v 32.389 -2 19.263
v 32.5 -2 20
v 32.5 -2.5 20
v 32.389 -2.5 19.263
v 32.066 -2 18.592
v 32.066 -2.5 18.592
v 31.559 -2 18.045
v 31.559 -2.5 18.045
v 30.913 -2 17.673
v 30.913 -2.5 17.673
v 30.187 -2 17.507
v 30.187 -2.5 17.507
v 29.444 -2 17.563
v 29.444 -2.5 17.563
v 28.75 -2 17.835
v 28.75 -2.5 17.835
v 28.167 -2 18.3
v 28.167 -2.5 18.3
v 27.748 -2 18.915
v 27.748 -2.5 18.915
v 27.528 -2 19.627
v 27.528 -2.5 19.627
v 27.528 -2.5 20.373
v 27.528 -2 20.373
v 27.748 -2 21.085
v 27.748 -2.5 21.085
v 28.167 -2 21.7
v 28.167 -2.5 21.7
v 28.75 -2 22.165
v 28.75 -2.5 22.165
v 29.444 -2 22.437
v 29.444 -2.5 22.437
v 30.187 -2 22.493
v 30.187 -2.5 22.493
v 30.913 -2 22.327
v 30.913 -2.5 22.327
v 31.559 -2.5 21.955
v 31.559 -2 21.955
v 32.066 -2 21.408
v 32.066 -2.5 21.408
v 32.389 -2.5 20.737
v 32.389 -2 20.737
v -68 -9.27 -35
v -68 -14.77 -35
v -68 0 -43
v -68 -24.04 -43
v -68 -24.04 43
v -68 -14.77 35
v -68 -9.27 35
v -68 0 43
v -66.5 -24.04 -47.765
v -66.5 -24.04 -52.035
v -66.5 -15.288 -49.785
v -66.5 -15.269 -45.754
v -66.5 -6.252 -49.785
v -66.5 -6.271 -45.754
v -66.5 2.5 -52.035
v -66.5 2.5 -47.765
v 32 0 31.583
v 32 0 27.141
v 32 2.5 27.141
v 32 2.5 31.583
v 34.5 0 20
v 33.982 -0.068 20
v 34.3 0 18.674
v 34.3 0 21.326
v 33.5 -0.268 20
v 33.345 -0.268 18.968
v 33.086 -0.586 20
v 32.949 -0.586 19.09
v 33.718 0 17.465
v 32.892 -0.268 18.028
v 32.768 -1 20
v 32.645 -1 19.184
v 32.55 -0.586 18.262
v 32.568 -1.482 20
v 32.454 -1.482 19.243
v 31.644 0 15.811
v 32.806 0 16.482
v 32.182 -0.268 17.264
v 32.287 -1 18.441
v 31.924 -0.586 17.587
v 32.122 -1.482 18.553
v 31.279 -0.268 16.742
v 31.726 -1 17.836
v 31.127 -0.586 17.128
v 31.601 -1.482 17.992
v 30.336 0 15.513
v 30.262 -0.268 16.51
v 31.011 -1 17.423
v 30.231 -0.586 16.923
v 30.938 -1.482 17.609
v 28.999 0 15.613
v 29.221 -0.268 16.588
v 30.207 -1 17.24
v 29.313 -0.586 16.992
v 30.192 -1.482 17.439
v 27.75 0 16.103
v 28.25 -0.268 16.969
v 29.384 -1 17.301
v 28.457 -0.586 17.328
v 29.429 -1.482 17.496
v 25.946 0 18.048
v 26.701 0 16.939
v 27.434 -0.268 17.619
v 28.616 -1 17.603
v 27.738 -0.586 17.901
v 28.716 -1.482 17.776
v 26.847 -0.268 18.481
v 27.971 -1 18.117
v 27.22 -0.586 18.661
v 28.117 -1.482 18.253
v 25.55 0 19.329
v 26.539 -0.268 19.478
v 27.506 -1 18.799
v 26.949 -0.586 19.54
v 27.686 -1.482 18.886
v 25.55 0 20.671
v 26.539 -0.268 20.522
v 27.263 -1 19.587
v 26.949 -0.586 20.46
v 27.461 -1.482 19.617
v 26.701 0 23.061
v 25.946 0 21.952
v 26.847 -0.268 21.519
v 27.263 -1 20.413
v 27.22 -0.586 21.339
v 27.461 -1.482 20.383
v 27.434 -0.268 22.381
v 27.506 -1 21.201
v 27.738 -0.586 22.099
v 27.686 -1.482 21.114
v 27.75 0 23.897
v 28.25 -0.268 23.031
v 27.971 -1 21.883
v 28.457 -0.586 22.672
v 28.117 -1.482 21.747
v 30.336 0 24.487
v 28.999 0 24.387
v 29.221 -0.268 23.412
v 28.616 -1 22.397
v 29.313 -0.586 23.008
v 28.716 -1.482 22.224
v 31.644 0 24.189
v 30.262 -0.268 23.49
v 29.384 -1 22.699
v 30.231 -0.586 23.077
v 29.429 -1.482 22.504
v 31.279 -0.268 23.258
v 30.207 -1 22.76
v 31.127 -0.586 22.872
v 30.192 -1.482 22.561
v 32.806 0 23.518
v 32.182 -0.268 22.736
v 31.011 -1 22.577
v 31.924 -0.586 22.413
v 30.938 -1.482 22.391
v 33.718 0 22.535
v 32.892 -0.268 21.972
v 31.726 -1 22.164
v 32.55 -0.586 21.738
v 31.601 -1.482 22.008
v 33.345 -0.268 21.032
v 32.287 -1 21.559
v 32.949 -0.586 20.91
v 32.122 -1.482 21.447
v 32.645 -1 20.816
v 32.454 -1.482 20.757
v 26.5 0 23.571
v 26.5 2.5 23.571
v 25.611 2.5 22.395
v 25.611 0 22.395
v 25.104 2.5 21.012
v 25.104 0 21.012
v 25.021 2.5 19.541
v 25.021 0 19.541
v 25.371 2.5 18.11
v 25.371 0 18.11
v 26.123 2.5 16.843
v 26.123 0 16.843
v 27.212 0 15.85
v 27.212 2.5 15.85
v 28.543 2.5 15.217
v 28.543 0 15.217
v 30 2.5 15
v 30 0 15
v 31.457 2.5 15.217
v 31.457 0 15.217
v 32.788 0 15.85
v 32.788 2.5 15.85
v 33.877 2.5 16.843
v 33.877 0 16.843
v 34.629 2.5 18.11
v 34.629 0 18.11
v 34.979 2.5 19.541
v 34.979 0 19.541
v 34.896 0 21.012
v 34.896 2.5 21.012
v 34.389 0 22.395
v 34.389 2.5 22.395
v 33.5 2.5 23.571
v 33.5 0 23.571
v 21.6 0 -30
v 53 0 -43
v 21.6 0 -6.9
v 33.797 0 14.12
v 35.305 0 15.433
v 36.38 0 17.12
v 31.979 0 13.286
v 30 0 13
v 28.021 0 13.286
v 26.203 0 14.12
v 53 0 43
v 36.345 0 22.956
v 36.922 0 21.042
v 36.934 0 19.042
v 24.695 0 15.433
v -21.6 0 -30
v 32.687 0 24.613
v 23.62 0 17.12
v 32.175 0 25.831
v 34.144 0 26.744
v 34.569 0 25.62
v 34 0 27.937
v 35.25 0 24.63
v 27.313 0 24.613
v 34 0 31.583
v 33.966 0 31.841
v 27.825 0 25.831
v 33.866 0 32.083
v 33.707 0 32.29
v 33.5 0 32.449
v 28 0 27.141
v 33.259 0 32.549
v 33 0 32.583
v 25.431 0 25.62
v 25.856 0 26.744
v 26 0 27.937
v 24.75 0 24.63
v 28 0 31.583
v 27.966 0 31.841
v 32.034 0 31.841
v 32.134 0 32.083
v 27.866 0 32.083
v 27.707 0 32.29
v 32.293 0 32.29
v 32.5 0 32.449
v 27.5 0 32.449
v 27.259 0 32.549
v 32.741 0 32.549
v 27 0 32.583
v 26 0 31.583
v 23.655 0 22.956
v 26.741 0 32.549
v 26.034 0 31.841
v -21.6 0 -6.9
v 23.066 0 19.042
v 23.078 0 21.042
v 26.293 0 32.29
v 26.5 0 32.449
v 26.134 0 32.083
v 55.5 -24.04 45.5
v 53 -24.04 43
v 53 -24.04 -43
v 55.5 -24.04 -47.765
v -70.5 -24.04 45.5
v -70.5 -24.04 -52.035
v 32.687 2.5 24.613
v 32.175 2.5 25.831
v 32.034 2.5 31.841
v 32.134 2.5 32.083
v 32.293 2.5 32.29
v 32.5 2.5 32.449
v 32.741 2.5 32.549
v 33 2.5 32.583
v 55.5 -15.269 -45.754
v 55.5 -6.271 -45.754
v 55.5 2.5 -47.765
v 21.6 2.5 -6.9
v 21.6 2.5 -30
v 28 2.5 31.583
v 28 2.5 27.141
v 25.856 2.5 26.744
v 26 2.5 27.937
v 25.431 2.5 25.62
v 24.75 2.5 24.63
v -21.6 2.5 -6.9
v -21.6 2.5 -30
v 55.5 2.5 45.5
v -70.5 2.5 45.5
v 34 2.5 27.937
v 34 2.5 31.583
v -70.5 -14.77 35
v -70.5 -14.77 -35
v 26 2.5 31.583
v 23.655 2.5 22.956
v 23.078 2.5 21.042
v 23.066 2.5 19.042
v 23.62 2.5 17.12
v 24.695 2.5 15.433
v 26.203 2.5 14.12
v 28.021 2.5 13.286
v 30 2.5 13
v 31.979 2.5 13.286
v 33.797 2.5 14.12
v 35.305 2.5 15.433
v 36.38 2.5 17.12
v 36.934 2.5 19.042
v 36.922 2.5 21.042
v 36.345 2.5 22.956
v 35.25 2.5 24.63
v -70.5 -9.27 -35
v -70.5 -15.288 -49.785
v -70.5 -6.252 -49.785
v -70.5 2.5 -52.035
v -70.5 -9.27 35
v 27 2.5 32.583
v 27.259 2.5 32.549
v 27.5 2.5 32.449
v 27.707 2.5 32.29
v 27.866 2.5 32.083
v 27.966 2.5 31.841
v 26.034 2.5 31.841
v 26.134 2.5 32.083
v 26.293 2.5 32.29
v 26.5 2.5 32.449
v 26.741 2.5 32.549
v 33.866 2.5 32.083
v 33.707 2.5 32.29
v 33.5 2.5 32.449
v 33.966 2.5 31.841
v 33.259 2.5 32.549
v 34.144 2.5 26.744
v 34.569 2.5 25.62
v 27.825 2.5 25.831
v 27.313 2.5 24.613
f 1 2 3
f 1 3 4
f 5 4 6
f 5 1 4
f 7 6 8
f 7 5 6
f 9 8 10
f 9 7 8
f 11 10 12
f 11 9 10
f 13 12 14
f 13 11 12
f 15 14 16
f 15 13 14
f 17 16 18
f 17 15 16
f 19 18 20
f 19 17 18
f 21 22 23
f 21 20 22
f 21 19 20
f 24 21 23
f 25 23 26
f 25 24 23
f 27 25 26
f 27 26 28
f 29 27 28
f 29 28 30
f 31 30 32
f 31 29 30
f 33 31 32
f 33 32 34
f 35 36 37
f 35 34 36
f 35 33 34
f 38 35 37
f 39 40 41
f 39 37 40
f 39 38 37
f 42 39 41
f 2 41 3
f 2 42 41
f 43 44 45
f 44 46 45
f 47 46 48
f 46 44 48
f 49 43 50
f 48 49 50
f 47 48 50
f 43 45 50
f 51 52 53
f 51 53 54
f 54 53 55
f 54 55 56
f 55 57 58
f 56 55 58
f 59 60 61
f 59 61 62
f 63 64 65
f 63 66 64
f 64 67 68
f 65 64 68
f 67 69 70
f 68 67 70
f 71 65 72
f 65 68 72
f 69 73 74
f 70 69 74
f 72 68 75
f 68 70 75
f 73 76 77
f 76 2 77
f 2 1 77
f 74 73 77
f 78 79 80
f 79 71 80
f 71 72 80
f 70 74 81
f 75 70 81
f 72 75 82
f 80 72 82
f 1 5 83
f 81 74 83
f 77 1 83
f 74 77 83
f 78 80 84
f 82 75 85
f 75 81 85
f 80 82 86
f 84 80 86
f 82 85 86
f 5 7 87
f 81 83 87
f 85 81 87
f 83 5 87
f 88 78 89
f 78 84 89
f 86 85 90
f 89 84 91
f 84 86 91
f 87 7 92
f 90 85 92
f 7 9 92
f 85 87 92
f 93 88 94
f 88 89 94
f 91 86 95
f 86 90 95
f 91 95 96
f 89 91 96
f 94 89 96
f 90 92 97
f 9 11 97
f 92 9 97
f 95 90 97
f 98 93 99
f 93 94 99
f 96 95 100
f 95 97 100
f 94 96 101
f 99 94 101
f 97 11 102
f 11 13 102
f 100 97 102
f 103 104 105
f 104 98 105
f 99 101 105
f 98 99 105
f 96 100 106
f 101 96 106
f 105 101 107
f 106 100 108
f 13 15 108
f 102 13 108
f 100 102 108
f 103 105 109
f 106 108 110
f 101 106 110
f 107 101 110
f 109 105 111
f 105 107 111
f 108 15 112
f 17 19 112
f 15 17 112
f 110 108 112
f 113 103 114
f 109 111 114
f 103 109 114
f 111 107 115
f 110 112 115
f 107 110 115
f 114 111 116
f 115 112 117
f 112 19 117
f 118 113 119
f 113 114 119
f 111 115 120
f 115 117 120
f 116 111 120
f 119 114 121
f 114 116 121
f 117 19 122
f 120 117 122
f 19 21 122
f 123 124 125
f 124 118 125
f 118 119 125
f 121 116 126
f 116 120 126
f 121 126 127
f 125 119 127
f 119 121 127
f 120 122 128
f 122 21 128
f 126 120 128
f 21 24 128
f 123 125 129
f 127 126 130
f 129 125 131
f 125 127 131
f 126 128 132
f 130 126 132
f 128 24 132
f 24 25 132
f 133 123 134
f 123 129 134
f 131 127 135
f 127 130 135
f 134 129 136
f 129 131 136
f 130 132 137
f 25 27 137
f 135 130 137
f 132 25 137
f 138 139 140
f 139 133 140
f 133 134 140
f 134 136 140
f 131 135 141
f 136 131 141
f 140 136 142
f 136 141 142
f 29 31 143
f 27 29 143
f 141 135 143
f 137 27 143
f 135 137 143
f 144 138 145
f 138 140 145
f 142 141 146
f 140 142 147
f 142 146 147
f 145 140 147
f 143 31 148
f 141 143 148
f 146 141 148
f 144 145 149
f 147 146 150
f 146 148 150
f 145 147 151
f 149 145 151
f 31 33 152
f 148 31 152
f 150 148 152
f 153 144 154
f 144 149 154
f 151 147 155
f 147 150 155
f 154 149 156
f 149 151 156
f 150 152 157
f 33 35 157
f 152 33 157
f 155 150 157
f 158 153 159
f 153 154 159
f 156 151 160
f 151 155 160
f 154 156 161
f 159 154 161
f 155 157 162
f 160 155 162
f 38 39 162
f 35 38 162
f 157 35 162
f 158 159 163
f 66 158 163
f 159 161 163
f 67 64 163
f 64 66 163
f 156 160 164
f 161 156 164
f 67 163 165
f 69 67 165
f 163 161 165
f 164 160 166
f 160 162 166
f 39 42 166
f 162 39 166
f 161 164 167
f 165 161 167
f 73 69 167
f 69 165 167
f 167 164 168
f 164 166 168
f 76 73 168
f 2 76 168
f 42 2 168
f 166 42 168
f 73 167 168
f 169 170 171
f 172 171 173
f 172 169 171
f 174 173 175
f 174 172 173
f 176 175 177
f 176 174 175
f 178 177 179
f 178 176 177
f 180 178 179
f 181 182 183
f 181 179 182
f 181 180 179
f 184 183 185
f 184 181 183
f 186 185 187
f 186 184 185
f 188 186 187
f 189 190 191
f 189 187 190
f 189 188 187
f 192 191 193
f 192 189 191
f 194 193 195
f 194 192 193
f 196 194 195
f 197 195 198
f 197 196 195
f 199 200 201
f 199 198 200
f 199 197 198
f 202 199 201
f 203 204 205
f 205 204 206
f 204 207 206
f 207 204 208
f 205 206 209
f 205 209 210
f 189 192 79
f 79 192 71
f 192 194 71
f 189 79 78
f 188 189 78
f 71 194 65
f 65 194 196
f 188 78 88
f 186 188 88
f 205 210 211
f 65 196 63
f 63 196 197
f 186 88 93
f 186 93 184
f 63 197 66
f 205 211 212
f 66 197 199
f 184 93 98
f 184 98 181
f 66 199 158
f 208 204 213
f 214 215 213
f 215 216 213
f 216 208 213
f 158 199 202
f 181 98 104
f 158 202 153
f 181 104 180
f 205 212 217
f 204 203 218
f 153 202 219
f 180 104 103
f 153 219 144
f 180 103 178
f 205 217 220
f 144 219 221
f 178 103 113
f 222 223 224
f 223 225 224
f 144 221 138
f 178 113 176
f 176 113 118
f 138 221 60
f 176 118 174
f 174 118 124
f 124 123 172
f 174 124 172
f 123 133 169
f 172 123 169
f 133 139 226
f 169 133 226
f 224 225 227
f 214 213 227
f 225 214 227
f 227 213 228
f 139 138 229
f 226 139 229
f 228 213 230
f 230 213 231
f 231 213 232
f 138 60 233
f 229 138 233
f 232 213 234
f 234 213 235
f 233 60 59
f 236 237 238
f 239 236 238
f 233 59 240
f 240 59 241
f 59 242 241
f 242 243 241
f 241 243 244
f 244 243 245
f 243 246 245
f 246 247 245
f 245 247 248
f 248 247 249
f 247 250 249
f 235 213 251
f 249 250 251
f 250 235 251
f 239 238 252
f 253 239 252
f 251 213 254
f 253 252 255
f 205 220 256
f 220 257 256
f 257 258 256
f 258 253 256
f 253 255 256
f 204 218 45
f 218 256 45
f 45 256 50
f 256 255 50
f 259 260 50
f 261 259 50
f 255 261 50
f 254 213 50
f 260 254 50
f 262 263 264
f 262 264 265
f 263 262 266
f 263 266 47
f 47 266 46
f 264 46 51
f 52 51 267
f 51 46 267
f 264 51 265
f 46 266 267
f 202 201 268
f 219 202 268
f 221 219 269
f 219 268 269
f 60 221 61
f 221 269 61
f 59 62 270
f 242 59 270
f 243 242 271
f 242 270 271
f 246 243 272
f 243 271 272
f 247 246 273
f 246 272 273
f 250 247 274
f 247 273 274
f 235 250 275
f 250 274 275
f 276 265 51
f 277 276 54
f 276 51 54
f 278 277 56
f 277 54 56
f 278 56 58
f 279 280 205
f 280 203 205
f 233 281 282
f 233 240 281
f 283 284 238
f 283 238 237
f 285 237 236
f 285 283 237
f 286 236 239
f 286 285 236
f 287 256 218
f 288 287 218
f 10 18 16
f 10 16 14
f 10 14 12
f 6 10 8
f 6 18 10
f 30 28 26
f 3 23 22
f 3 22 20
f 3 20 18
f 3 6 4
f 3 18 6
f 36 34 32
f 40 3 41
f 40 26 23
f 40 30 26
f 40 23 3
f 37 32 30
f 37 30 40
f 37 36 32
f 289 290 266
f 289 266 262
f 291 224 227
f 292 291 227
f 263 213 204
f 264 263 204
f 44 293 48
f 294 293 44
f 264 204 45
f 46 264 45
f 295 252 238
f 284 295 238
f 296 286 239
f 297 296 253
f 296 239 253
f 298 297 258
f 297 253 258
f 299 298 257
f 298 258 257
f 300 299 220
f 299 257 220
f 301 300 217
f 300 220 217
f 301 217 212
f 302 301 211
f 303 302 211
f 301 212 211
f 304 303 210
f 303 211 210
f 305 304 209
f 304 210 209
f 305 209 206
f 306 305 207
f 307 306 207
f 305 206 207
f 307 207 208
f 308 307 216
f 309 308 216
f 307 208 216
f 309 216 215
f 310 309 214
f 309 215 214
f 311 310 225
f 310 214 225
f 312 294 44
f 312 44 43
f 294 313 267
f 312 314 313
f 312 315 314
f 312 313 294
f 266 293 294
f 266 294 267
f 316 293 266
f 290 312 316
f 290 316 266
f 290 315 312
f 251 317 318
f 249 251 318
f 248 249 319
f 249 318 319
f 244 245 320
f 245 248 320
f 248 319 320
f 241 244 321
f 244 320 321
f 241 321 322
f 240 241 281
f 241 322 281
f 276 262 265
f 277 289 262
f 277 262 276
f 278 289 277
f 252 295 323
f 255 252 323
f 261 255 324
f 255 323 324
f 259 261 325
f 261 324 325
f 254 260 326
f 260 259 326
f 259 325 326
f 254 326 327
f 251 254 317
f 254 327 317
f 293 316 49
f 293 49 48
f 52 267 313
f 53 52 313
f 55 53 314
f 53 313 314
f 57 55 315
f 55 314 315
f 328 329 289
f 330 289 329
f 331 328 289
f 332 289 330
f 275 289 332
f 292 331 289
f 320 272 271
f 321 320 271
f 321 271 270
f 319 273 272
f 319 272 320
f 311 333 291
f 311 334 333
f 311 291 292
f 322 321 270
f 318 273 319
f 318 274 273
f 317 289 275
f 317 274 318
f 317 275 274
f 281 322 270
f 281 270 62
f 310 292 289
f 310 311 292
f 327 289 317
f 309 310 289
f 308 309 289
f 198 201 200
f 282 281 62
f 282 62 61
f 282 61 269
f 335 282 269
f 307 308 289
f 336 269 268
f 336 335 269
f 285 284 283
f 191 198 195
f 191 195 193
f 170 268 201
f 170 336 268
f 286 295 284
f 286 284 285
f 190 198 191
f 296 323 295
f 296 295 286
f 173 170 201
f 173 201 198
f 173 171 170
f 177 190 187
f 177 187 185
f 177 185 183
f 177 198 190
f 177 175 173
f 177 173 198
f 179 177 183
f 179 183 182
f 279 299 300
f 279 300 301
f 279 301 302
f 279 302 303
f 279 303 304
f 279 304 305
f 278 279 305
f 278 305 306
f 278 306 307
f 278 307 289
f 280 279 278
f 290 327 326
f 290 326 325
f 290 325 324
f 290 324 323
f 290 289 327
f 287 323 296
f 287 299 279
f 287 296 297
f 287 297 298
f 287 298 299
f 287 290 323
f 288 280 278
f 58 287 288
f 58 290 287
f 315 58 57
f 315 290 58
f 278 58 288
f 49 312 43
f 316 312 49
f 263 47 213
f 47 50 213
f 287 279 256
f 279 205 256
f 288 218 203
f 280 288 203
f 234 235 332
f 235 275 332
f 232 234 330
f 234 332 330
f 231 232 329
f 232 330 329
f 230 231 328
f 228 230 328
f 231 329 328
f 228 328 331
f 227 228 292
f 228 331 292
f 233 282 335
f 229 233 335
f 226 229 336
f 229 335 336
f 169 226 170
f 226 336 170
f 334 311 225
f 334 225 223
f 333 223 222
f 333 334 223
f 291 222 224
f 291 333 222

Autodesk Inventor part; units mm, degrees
ref_plane "YZ Plane" through (0, 0, 0) normal (1, 0, 0) x (0, 1, 0)
ref_plane "XZ Plane" through (0, 0, 0) normal (0, 1, 0) x (-1, 0, 0)
ref_plane "XY Plane" through (0, 0, 0) normal (0, 0, 1) x (1, 0, 0)
sketch "Эскиз1" plane through (0, 0, 0) normal (0, 1, 0) x (-1, 0, 0)
  line L0 (50, -40) -> (-50, -40)
  line L1 (-50, -40) -> (-50, 40)
  line L2 (-50, 40) -> (50, 40)
  line L3 (50, 40) -> (50, -40)
  line L4 (50, -40) -> (-50, 40) construction
  line L5 (-50, -40) -> (50, 40) construction
  line L6 (21.6, -30) -> (-21.6, -30)
  line L7 (-21.6, -30) -> (-21.6, -6.9)
  line L8 (-21.6, -6.9) -> (21.6, -6.9)
  line L9 (21.6, -6.9) -> (21.6, -30)
  line L10 (-53, -43) -> (53, -43)
  line L11 (53, -43) -> (53, 43)
  line L12 (53, 43) -> (-53, 43)
  line L13 (-53, 43) -> (-53, -43)
  line L14 (53, 43) -> (68, 43)
  line L15 (68, 43) -> (68, -43)
  line L16 (68, -43) -> (53, -43)
  line L17 (53, -43) -> (53, 43)
  line L18 (-53, -43) -> (68, -43)
  line L19 (68, -43) -> (68, 43)
  line L20 (68, 43) -> (-53, 43)
  line L21 (-53, 43) -> (-53, -43)
  line L22 (0, -40) -> (0, 40)
  circle A0 centre (-30, 20) radius 5
  circle A1 centre (-30, 20) radius 7
  line L23 (-30, 20) -> (-30, 40)
  line L24 (-28, 30.5826) -> (-32, 30.5826)
  line L25 (-32, 30.5826) -> (-32, 24.5826)
  line L26 (-32, 24.5826) -> (-28, 24.5826)
  line L27 (-28, 24.5826) -> (-28, 30.5826)
  line L28 (-28, 30.5826) -> (-32, 24.5826) construction
  line L29 (-32, 30.5826) -> (-28, 24.5826) construction
  line L30 (-34, 22.5826) -> (-34, 32.5826)
  line L31 (-34, 32.5826) -> (-26, 32.5826)
  line L32 (-26, 32.5826) -> (-26, 22.5826)
  line L33 (-26, 22.5826) -> (-34, 22.5826)
  line L34 (-28, 30.5826) -> (-32, 30.5826)
  line L35 (-32, 30.5826) -> (-32, 32.5826)
  line L36 (-32, 32.5826) -> (-28, 32.5826)
  line L37 (-28, 32.5826) -> (-28, 30.5826)
  line L38 (-55.5, -45.5) -> (70.5, -45.5)
  line L39 (70.5, -45.5) -> (70.5, 45.5)
  line L40 (-55.5, -45.5) -> (-55.5, 45.5)
  line L41 (-55.5, 45.5) -> (70.5, 45.5)
  point P0 (0, 0)
  point P1 (0, -30)
  point P2 (-30, 27.5826)
  point P3 (53, -43)
  point P4 (-26, 25.7446)
  point P5 (-34, 25.7446)
  point P6 (53, -43)
  dimension "d7" = 10
  dimension "d0" = 100
  dimension "d1" = 80
  dimension "d2" = 43.2
  dimension "d3" = 23.1
  dimension "d4" = 3
  dimension "d5" = 15
  dimension "d6" = 10
  dimension "d8" = 2
  dimension "d9" = 20
  dimension "d10" = 20
  dimension "d11" = 4
  dimension "d12" = 6
  dimension "d13" = 2
  dimension "d22" = 2.5
  dimension "d23" = 2.5
extrude "Выдавливание1" add sketch "Эскиз1" along normal blind 2.5 contours L0 L22 L6 L9 L8 L2 L3 | L0 L1 L2 L22 L8 L7 L6 | L13 L12 L11 L10 | L11 L14 L15 L16 | A0 L30 L33 L32 | L32 L33 L23 L26 A0 | A0 L26 L23 L33 L30 | L26 L23 A0 | A0 L23 A1 L27 | L25 A1 L23 A0 | A0 L23 L26 | A1 L23 L24 L27 | L25 L24 L23 A1 | L24 L23 L31 L37 | L35 L31 L23 L24 | L40 L41 L39 L38
fillet "Сопряжение1" radius 5 4 edges at (26, 1.25, 25.7446) (28, 1.25, 24.5826) (32, 1.25, 24.5826) (34, 1.25, 25.7446)
fillet "Сопряжение2" radius 1 4 edges at (26, 1.25, 32.5826) (28, 1.25, 32.5826) (32, 1.25, 32.5826) (34, 1.25, 32.5826)
sketch "Эскиз2" plane through (0, 0, 0) normal (0, -1, 0) x (1, 0, 0)
  line L0 (-21.6, -30) -> (21.6, -30) projected
  line L1 (-21.6, -6.9) -> (-21.6, -30) projected
  line L2 (21.6, -6.9) -> (-21.6, -6.9) projected
  line L3 (21.6, -30) -> (21.6, -6.9) projected
  arc A0 (34, 27.9373) -> (35.25, 24.6301) centre (39, 27.9373) ccw projected
  arc A1 (24.75, 24.6301) -> (35.25, 24.6301) centre (30, 20) ccw projected
  arc A2 (24.75, 24.6301) -> (26, 27.9373) centre (21, 27.9373) ccw projected
  line L4 (26, 31.5826) -> (26, 27.9373) projected
  arc A3 (28, 31.5826) -> (26, 31.5826) centre (27, 31.5826) ccw projected
  line L5 (28, 27.1414) -> (28, 31.5826) projected
  arc A4 (26.5, 23.5707) -> (28, 27.1414) centre (23, 27.1414) ccw projected
  arc A5 (26.5, 23.5707) -> (33.5, 23.5707) centre (30, 20) ccw projected
  arc A6 (32, 27.1414) -> (33.5, 23.5707) centre (37, 27.1414) ccw projected
  line L6 (32, 31.5826) -> (32, 27.1414) projected
  arc A7 (34, 31.5826) -> (32, 31.5826) centre (33, 31.5826) ccw projected
  line L7 (34, 27.9373) -> (34, 31.5826) projected
  circle A8 centre (30, 20) radius 2.5
  point P0 (0, 0)
  dimension "d18" = 5
extrude "Выдавливание2" add sketch "Эскиз2" along normal blind 2.5 contours A8
fillet "Сопряжение3" radius 2 1 edges at (27.5, 0, 20)
sketch "Эскиз3" plane through (0, 0, 0) normal (0, -1, 0) x (1, 0, 0)
  arc A0 (34, 27.9373) -> (35.25, 24.6301) centre (39, 27.9373) ccw projected
  arc A1 (24.75, 24.6301) -> (35.25, 24.6301) centre (30, 20) ccw projected
  arc A2 (24.75, 24.6301) -> (26, 27.9373) centre (21, 27.9373) ccw projected
  line L0 (26, 31.5826) -> (26, 27.9373) projected
  arc A3 (28, 31.5826) -> (26, 31.5826) centre (27, 31.5826) ccw projected
  line L1 (28, 27.1414) -> (28, 31.5826) projected
  arc A4 (26.5, 23.5707) -> (28, 27.1414) centre (23, 27.1414) ccw projected
  arc A5 (26.5, 23.5707) -> (33.5, 23.5707) centre (30, 20) ccw projected
  arc A6 (32, 27.1414) -> (33.5, 23.5707) centre (37, 27.1414) ccw projected
  line L2 (32, 31.5826) -> (32, 27.1414) projected
  arc A7 (34, 31.5826) -> (32, 31.5826) centre (33, 31.5826) ccw projected
  line L3 (34, 27.9373) -> (34, 31.5826) projected
  line L4 (-21.6, -30) -> (21.6, -30) projected
  line L5 (-21.6, -6.9) -> (-21.6, -30) projected
  line L6 (21.6, -6.9) -> (-21.6, -6.9) projected
  line L7 (21.6, -30) -> (21.6, -6.9) projected
  circle A8 centre (30, 20) radius 4.5 projected
  line L8 (55.5, -45.5) -> (-70.5, -45.5) projected
  line L9 (55.5, 45.5) -> (55.5, -45.5) projected
  line L10 (-70.5, 45.5) -> (55.5, 45.5) projected
  line L11 (-70.5, -45.5) -> (-70.5, 45.5) projected
  arc A9 (34, 27.9373) -> (35.25, 24.6301) centre (39, 27.9373) ccw projected
  arc A10 (24.75, 24.6301) -> (35.25, 24.6301) centre (30, 20) ccw projected
  arc A11 (24.75, 24.6301) -> (26, 27.9373) centre (21, 27.9373) ccw projected
  line L12 (26, 31.5826) -> (26, 27.9373) projected
  arc A12 (28, 31.5826) -> (26, 31.5826) centre (27, 31.5826) ccw projected
  line L13 (28, 27.1414) -> (28, 31.5826) projected
  arc A13 (26.5, 23.5707) -> (28, 27.1414) centre (23, 27.1414) ccw projected
  arc A14 (26.5, 23.5707) -> (33.5, 23.5707) centre (30, 20) ccw projected
  arc A15 (32, 27.1414) -> (33.5, 23.5707) centre (37, 27.1414) ccw projected
  line L14 (32, 31.5826) -> (32, 27.1414) projected
  arc A16 (34, 31.5826) -> (32, 31.5826) centre (33, 31.5826) ccw projected
  line L15 (34, 27.9373) -> (34, 31.5826) projected
  line L16 (-21.6, -30) -> (21.6, -30) projected
  line L17 (-21.6, -6.9) -> (-21.6, -30) projected
  line L18 (21.6, -6.9) -> (-21.6, -6.9) projected
  line L19 (21.6, -30) -> (21.6, -6.9) projected
  circle A17 centre (30, 20) radius 4.5 projected
  line L20 (53, 43) -> (53, -43)
  line L21 (53, -43) -> (-68, -43)
  line L22 (-68, -43) -> (-68, 43)
  line L23 (-68, 43) -> (53, 43)
  dimension "d28" = 2.5
extrude "Выдавливание3" add sketch "Эскиз3" along normal blind 24.04 contours L8 L11 L10 L9
sketch "Эскиз4" plane through (-70.5, 2.5, -45.5) normal (-1, 0, 0) x (0, 0, 1)
  line L0 (91, -26.54) -> (91, 0) projected
  line L1 (0, 0) -> (91, 0) projected
  line L2 (0, -26.54) -> (0, 0) projected
  line L3 (91, -26.54) -> (0, -26.54) projected
  line L4 (0, 0) -> (0, -26.54) projected
  line L5 (0, -13.27) -> (-40, -13.27)
  circle A0 centre (-40, -13.27) radius 40
  line L6 (0, -26.54) -> (0, 0) projected
  line L7 (0, -26.54) -> (-2.2653, -26.54)
  line L8 (-2.2653, -26.54) -> (-2.2653, 0)
  line L9 (-2.2653, 0) -> (0, 0)
  line L10 (0, 0) -> (0, -26.54)
  line L11 (0, 0) -> (91, 0) projected
  point P0 (45.5, -2.5)
  point P1 (-2.2653, -26.54)
  dimension "d29" = 80
extrude "Выдавливание4" add sketch "Эскиз4" against normal up to surface (126 mm away) contours L7 A0 L2 | L2 A0 L9
sketch "Эскиз5" plane through (-70.5, -24.04, 45.5) normal (-1, 0, 0) x (0, 0, 1)
  line L0 (0, 0) -> (0, 26.54) projected
  line L1 (0, 26.54) -> (-93.2653, 26.54) projected
  arc A0 (-93.2653, 0) -> (-93.2653, 26.54) centre (-131, 13.27) ccw projected
  line L2 (0, 0) -> (-93.2653, 0) projected
  circle A1 centre (-131, 13.27) radius 40
  circle A2 centre (-131, 13.27) radius 36
  line L3 (-93.2653, 0) -> (-97.535, 0)
  arc A3 (-93.2653, 0) -> (-93.2653, 26.54) centre (-131, 13.27) ccw projected
  line L4 (-93.2653, 26.54) -> (-97.535, 26.54)
  point P0 (-45.5, 24.04)
  dimension "d32" = 4
extrude "Выдавливание5" add sketch "Эскиз5" against normal blind 4 contours L3 A2 L4 A0
sketch "Эскиз6" plane through (-70.5, -24.04, 45.5) normal (-1, 0, 0) x (0, 0, 1)
  line L0 (-2.5, 24.04) -> (-88.5, 24.04) projected
  line L1 (-2.5, 24.04) -> (-2.5, 0) projected
  line L2 (-88.5, 0) -> (-2.5, 0) projected
  line L3 (-88.5, 24.04) -> (-88.5, 0) projected
  line L4 (-88.5, 24.04) -> (-88.5, 0) projected
  line L5 (-88.5, 12.02) -> (-2.5, 12.02)
  line L6 (-2.5, 24.04) -> (-2.5, 0) projected
  line L7 (-10.5, 9.27) -> (-80.5, 9.27)
  line L8 (-80.5, 9.27) -> (-80.5, 14.77)
  line L9 (-80.5, 14.77) -> (-10.5, 14.77)
  line L10 (-10.5, 14.77) -> (-10.5, 9.27)
  line L11 (-10.5, 9.27) -> (-80.5, 14.77) construction
  line L12 (-80.5, 9.27) -> (-10.5, 14.77) construction
  point P0 (-45.5, 24.04)
  point P1 (-45.5, 12.02)
  dimension "d35" = 70
  dimension "d36" = 5.5
extrude "Выдавливание6" cut sketch "Эскиз6" against normal blind 4 contours L10 L7 L8 L5 | L5 L8 L9 L10
properties part number "tacho_base"
